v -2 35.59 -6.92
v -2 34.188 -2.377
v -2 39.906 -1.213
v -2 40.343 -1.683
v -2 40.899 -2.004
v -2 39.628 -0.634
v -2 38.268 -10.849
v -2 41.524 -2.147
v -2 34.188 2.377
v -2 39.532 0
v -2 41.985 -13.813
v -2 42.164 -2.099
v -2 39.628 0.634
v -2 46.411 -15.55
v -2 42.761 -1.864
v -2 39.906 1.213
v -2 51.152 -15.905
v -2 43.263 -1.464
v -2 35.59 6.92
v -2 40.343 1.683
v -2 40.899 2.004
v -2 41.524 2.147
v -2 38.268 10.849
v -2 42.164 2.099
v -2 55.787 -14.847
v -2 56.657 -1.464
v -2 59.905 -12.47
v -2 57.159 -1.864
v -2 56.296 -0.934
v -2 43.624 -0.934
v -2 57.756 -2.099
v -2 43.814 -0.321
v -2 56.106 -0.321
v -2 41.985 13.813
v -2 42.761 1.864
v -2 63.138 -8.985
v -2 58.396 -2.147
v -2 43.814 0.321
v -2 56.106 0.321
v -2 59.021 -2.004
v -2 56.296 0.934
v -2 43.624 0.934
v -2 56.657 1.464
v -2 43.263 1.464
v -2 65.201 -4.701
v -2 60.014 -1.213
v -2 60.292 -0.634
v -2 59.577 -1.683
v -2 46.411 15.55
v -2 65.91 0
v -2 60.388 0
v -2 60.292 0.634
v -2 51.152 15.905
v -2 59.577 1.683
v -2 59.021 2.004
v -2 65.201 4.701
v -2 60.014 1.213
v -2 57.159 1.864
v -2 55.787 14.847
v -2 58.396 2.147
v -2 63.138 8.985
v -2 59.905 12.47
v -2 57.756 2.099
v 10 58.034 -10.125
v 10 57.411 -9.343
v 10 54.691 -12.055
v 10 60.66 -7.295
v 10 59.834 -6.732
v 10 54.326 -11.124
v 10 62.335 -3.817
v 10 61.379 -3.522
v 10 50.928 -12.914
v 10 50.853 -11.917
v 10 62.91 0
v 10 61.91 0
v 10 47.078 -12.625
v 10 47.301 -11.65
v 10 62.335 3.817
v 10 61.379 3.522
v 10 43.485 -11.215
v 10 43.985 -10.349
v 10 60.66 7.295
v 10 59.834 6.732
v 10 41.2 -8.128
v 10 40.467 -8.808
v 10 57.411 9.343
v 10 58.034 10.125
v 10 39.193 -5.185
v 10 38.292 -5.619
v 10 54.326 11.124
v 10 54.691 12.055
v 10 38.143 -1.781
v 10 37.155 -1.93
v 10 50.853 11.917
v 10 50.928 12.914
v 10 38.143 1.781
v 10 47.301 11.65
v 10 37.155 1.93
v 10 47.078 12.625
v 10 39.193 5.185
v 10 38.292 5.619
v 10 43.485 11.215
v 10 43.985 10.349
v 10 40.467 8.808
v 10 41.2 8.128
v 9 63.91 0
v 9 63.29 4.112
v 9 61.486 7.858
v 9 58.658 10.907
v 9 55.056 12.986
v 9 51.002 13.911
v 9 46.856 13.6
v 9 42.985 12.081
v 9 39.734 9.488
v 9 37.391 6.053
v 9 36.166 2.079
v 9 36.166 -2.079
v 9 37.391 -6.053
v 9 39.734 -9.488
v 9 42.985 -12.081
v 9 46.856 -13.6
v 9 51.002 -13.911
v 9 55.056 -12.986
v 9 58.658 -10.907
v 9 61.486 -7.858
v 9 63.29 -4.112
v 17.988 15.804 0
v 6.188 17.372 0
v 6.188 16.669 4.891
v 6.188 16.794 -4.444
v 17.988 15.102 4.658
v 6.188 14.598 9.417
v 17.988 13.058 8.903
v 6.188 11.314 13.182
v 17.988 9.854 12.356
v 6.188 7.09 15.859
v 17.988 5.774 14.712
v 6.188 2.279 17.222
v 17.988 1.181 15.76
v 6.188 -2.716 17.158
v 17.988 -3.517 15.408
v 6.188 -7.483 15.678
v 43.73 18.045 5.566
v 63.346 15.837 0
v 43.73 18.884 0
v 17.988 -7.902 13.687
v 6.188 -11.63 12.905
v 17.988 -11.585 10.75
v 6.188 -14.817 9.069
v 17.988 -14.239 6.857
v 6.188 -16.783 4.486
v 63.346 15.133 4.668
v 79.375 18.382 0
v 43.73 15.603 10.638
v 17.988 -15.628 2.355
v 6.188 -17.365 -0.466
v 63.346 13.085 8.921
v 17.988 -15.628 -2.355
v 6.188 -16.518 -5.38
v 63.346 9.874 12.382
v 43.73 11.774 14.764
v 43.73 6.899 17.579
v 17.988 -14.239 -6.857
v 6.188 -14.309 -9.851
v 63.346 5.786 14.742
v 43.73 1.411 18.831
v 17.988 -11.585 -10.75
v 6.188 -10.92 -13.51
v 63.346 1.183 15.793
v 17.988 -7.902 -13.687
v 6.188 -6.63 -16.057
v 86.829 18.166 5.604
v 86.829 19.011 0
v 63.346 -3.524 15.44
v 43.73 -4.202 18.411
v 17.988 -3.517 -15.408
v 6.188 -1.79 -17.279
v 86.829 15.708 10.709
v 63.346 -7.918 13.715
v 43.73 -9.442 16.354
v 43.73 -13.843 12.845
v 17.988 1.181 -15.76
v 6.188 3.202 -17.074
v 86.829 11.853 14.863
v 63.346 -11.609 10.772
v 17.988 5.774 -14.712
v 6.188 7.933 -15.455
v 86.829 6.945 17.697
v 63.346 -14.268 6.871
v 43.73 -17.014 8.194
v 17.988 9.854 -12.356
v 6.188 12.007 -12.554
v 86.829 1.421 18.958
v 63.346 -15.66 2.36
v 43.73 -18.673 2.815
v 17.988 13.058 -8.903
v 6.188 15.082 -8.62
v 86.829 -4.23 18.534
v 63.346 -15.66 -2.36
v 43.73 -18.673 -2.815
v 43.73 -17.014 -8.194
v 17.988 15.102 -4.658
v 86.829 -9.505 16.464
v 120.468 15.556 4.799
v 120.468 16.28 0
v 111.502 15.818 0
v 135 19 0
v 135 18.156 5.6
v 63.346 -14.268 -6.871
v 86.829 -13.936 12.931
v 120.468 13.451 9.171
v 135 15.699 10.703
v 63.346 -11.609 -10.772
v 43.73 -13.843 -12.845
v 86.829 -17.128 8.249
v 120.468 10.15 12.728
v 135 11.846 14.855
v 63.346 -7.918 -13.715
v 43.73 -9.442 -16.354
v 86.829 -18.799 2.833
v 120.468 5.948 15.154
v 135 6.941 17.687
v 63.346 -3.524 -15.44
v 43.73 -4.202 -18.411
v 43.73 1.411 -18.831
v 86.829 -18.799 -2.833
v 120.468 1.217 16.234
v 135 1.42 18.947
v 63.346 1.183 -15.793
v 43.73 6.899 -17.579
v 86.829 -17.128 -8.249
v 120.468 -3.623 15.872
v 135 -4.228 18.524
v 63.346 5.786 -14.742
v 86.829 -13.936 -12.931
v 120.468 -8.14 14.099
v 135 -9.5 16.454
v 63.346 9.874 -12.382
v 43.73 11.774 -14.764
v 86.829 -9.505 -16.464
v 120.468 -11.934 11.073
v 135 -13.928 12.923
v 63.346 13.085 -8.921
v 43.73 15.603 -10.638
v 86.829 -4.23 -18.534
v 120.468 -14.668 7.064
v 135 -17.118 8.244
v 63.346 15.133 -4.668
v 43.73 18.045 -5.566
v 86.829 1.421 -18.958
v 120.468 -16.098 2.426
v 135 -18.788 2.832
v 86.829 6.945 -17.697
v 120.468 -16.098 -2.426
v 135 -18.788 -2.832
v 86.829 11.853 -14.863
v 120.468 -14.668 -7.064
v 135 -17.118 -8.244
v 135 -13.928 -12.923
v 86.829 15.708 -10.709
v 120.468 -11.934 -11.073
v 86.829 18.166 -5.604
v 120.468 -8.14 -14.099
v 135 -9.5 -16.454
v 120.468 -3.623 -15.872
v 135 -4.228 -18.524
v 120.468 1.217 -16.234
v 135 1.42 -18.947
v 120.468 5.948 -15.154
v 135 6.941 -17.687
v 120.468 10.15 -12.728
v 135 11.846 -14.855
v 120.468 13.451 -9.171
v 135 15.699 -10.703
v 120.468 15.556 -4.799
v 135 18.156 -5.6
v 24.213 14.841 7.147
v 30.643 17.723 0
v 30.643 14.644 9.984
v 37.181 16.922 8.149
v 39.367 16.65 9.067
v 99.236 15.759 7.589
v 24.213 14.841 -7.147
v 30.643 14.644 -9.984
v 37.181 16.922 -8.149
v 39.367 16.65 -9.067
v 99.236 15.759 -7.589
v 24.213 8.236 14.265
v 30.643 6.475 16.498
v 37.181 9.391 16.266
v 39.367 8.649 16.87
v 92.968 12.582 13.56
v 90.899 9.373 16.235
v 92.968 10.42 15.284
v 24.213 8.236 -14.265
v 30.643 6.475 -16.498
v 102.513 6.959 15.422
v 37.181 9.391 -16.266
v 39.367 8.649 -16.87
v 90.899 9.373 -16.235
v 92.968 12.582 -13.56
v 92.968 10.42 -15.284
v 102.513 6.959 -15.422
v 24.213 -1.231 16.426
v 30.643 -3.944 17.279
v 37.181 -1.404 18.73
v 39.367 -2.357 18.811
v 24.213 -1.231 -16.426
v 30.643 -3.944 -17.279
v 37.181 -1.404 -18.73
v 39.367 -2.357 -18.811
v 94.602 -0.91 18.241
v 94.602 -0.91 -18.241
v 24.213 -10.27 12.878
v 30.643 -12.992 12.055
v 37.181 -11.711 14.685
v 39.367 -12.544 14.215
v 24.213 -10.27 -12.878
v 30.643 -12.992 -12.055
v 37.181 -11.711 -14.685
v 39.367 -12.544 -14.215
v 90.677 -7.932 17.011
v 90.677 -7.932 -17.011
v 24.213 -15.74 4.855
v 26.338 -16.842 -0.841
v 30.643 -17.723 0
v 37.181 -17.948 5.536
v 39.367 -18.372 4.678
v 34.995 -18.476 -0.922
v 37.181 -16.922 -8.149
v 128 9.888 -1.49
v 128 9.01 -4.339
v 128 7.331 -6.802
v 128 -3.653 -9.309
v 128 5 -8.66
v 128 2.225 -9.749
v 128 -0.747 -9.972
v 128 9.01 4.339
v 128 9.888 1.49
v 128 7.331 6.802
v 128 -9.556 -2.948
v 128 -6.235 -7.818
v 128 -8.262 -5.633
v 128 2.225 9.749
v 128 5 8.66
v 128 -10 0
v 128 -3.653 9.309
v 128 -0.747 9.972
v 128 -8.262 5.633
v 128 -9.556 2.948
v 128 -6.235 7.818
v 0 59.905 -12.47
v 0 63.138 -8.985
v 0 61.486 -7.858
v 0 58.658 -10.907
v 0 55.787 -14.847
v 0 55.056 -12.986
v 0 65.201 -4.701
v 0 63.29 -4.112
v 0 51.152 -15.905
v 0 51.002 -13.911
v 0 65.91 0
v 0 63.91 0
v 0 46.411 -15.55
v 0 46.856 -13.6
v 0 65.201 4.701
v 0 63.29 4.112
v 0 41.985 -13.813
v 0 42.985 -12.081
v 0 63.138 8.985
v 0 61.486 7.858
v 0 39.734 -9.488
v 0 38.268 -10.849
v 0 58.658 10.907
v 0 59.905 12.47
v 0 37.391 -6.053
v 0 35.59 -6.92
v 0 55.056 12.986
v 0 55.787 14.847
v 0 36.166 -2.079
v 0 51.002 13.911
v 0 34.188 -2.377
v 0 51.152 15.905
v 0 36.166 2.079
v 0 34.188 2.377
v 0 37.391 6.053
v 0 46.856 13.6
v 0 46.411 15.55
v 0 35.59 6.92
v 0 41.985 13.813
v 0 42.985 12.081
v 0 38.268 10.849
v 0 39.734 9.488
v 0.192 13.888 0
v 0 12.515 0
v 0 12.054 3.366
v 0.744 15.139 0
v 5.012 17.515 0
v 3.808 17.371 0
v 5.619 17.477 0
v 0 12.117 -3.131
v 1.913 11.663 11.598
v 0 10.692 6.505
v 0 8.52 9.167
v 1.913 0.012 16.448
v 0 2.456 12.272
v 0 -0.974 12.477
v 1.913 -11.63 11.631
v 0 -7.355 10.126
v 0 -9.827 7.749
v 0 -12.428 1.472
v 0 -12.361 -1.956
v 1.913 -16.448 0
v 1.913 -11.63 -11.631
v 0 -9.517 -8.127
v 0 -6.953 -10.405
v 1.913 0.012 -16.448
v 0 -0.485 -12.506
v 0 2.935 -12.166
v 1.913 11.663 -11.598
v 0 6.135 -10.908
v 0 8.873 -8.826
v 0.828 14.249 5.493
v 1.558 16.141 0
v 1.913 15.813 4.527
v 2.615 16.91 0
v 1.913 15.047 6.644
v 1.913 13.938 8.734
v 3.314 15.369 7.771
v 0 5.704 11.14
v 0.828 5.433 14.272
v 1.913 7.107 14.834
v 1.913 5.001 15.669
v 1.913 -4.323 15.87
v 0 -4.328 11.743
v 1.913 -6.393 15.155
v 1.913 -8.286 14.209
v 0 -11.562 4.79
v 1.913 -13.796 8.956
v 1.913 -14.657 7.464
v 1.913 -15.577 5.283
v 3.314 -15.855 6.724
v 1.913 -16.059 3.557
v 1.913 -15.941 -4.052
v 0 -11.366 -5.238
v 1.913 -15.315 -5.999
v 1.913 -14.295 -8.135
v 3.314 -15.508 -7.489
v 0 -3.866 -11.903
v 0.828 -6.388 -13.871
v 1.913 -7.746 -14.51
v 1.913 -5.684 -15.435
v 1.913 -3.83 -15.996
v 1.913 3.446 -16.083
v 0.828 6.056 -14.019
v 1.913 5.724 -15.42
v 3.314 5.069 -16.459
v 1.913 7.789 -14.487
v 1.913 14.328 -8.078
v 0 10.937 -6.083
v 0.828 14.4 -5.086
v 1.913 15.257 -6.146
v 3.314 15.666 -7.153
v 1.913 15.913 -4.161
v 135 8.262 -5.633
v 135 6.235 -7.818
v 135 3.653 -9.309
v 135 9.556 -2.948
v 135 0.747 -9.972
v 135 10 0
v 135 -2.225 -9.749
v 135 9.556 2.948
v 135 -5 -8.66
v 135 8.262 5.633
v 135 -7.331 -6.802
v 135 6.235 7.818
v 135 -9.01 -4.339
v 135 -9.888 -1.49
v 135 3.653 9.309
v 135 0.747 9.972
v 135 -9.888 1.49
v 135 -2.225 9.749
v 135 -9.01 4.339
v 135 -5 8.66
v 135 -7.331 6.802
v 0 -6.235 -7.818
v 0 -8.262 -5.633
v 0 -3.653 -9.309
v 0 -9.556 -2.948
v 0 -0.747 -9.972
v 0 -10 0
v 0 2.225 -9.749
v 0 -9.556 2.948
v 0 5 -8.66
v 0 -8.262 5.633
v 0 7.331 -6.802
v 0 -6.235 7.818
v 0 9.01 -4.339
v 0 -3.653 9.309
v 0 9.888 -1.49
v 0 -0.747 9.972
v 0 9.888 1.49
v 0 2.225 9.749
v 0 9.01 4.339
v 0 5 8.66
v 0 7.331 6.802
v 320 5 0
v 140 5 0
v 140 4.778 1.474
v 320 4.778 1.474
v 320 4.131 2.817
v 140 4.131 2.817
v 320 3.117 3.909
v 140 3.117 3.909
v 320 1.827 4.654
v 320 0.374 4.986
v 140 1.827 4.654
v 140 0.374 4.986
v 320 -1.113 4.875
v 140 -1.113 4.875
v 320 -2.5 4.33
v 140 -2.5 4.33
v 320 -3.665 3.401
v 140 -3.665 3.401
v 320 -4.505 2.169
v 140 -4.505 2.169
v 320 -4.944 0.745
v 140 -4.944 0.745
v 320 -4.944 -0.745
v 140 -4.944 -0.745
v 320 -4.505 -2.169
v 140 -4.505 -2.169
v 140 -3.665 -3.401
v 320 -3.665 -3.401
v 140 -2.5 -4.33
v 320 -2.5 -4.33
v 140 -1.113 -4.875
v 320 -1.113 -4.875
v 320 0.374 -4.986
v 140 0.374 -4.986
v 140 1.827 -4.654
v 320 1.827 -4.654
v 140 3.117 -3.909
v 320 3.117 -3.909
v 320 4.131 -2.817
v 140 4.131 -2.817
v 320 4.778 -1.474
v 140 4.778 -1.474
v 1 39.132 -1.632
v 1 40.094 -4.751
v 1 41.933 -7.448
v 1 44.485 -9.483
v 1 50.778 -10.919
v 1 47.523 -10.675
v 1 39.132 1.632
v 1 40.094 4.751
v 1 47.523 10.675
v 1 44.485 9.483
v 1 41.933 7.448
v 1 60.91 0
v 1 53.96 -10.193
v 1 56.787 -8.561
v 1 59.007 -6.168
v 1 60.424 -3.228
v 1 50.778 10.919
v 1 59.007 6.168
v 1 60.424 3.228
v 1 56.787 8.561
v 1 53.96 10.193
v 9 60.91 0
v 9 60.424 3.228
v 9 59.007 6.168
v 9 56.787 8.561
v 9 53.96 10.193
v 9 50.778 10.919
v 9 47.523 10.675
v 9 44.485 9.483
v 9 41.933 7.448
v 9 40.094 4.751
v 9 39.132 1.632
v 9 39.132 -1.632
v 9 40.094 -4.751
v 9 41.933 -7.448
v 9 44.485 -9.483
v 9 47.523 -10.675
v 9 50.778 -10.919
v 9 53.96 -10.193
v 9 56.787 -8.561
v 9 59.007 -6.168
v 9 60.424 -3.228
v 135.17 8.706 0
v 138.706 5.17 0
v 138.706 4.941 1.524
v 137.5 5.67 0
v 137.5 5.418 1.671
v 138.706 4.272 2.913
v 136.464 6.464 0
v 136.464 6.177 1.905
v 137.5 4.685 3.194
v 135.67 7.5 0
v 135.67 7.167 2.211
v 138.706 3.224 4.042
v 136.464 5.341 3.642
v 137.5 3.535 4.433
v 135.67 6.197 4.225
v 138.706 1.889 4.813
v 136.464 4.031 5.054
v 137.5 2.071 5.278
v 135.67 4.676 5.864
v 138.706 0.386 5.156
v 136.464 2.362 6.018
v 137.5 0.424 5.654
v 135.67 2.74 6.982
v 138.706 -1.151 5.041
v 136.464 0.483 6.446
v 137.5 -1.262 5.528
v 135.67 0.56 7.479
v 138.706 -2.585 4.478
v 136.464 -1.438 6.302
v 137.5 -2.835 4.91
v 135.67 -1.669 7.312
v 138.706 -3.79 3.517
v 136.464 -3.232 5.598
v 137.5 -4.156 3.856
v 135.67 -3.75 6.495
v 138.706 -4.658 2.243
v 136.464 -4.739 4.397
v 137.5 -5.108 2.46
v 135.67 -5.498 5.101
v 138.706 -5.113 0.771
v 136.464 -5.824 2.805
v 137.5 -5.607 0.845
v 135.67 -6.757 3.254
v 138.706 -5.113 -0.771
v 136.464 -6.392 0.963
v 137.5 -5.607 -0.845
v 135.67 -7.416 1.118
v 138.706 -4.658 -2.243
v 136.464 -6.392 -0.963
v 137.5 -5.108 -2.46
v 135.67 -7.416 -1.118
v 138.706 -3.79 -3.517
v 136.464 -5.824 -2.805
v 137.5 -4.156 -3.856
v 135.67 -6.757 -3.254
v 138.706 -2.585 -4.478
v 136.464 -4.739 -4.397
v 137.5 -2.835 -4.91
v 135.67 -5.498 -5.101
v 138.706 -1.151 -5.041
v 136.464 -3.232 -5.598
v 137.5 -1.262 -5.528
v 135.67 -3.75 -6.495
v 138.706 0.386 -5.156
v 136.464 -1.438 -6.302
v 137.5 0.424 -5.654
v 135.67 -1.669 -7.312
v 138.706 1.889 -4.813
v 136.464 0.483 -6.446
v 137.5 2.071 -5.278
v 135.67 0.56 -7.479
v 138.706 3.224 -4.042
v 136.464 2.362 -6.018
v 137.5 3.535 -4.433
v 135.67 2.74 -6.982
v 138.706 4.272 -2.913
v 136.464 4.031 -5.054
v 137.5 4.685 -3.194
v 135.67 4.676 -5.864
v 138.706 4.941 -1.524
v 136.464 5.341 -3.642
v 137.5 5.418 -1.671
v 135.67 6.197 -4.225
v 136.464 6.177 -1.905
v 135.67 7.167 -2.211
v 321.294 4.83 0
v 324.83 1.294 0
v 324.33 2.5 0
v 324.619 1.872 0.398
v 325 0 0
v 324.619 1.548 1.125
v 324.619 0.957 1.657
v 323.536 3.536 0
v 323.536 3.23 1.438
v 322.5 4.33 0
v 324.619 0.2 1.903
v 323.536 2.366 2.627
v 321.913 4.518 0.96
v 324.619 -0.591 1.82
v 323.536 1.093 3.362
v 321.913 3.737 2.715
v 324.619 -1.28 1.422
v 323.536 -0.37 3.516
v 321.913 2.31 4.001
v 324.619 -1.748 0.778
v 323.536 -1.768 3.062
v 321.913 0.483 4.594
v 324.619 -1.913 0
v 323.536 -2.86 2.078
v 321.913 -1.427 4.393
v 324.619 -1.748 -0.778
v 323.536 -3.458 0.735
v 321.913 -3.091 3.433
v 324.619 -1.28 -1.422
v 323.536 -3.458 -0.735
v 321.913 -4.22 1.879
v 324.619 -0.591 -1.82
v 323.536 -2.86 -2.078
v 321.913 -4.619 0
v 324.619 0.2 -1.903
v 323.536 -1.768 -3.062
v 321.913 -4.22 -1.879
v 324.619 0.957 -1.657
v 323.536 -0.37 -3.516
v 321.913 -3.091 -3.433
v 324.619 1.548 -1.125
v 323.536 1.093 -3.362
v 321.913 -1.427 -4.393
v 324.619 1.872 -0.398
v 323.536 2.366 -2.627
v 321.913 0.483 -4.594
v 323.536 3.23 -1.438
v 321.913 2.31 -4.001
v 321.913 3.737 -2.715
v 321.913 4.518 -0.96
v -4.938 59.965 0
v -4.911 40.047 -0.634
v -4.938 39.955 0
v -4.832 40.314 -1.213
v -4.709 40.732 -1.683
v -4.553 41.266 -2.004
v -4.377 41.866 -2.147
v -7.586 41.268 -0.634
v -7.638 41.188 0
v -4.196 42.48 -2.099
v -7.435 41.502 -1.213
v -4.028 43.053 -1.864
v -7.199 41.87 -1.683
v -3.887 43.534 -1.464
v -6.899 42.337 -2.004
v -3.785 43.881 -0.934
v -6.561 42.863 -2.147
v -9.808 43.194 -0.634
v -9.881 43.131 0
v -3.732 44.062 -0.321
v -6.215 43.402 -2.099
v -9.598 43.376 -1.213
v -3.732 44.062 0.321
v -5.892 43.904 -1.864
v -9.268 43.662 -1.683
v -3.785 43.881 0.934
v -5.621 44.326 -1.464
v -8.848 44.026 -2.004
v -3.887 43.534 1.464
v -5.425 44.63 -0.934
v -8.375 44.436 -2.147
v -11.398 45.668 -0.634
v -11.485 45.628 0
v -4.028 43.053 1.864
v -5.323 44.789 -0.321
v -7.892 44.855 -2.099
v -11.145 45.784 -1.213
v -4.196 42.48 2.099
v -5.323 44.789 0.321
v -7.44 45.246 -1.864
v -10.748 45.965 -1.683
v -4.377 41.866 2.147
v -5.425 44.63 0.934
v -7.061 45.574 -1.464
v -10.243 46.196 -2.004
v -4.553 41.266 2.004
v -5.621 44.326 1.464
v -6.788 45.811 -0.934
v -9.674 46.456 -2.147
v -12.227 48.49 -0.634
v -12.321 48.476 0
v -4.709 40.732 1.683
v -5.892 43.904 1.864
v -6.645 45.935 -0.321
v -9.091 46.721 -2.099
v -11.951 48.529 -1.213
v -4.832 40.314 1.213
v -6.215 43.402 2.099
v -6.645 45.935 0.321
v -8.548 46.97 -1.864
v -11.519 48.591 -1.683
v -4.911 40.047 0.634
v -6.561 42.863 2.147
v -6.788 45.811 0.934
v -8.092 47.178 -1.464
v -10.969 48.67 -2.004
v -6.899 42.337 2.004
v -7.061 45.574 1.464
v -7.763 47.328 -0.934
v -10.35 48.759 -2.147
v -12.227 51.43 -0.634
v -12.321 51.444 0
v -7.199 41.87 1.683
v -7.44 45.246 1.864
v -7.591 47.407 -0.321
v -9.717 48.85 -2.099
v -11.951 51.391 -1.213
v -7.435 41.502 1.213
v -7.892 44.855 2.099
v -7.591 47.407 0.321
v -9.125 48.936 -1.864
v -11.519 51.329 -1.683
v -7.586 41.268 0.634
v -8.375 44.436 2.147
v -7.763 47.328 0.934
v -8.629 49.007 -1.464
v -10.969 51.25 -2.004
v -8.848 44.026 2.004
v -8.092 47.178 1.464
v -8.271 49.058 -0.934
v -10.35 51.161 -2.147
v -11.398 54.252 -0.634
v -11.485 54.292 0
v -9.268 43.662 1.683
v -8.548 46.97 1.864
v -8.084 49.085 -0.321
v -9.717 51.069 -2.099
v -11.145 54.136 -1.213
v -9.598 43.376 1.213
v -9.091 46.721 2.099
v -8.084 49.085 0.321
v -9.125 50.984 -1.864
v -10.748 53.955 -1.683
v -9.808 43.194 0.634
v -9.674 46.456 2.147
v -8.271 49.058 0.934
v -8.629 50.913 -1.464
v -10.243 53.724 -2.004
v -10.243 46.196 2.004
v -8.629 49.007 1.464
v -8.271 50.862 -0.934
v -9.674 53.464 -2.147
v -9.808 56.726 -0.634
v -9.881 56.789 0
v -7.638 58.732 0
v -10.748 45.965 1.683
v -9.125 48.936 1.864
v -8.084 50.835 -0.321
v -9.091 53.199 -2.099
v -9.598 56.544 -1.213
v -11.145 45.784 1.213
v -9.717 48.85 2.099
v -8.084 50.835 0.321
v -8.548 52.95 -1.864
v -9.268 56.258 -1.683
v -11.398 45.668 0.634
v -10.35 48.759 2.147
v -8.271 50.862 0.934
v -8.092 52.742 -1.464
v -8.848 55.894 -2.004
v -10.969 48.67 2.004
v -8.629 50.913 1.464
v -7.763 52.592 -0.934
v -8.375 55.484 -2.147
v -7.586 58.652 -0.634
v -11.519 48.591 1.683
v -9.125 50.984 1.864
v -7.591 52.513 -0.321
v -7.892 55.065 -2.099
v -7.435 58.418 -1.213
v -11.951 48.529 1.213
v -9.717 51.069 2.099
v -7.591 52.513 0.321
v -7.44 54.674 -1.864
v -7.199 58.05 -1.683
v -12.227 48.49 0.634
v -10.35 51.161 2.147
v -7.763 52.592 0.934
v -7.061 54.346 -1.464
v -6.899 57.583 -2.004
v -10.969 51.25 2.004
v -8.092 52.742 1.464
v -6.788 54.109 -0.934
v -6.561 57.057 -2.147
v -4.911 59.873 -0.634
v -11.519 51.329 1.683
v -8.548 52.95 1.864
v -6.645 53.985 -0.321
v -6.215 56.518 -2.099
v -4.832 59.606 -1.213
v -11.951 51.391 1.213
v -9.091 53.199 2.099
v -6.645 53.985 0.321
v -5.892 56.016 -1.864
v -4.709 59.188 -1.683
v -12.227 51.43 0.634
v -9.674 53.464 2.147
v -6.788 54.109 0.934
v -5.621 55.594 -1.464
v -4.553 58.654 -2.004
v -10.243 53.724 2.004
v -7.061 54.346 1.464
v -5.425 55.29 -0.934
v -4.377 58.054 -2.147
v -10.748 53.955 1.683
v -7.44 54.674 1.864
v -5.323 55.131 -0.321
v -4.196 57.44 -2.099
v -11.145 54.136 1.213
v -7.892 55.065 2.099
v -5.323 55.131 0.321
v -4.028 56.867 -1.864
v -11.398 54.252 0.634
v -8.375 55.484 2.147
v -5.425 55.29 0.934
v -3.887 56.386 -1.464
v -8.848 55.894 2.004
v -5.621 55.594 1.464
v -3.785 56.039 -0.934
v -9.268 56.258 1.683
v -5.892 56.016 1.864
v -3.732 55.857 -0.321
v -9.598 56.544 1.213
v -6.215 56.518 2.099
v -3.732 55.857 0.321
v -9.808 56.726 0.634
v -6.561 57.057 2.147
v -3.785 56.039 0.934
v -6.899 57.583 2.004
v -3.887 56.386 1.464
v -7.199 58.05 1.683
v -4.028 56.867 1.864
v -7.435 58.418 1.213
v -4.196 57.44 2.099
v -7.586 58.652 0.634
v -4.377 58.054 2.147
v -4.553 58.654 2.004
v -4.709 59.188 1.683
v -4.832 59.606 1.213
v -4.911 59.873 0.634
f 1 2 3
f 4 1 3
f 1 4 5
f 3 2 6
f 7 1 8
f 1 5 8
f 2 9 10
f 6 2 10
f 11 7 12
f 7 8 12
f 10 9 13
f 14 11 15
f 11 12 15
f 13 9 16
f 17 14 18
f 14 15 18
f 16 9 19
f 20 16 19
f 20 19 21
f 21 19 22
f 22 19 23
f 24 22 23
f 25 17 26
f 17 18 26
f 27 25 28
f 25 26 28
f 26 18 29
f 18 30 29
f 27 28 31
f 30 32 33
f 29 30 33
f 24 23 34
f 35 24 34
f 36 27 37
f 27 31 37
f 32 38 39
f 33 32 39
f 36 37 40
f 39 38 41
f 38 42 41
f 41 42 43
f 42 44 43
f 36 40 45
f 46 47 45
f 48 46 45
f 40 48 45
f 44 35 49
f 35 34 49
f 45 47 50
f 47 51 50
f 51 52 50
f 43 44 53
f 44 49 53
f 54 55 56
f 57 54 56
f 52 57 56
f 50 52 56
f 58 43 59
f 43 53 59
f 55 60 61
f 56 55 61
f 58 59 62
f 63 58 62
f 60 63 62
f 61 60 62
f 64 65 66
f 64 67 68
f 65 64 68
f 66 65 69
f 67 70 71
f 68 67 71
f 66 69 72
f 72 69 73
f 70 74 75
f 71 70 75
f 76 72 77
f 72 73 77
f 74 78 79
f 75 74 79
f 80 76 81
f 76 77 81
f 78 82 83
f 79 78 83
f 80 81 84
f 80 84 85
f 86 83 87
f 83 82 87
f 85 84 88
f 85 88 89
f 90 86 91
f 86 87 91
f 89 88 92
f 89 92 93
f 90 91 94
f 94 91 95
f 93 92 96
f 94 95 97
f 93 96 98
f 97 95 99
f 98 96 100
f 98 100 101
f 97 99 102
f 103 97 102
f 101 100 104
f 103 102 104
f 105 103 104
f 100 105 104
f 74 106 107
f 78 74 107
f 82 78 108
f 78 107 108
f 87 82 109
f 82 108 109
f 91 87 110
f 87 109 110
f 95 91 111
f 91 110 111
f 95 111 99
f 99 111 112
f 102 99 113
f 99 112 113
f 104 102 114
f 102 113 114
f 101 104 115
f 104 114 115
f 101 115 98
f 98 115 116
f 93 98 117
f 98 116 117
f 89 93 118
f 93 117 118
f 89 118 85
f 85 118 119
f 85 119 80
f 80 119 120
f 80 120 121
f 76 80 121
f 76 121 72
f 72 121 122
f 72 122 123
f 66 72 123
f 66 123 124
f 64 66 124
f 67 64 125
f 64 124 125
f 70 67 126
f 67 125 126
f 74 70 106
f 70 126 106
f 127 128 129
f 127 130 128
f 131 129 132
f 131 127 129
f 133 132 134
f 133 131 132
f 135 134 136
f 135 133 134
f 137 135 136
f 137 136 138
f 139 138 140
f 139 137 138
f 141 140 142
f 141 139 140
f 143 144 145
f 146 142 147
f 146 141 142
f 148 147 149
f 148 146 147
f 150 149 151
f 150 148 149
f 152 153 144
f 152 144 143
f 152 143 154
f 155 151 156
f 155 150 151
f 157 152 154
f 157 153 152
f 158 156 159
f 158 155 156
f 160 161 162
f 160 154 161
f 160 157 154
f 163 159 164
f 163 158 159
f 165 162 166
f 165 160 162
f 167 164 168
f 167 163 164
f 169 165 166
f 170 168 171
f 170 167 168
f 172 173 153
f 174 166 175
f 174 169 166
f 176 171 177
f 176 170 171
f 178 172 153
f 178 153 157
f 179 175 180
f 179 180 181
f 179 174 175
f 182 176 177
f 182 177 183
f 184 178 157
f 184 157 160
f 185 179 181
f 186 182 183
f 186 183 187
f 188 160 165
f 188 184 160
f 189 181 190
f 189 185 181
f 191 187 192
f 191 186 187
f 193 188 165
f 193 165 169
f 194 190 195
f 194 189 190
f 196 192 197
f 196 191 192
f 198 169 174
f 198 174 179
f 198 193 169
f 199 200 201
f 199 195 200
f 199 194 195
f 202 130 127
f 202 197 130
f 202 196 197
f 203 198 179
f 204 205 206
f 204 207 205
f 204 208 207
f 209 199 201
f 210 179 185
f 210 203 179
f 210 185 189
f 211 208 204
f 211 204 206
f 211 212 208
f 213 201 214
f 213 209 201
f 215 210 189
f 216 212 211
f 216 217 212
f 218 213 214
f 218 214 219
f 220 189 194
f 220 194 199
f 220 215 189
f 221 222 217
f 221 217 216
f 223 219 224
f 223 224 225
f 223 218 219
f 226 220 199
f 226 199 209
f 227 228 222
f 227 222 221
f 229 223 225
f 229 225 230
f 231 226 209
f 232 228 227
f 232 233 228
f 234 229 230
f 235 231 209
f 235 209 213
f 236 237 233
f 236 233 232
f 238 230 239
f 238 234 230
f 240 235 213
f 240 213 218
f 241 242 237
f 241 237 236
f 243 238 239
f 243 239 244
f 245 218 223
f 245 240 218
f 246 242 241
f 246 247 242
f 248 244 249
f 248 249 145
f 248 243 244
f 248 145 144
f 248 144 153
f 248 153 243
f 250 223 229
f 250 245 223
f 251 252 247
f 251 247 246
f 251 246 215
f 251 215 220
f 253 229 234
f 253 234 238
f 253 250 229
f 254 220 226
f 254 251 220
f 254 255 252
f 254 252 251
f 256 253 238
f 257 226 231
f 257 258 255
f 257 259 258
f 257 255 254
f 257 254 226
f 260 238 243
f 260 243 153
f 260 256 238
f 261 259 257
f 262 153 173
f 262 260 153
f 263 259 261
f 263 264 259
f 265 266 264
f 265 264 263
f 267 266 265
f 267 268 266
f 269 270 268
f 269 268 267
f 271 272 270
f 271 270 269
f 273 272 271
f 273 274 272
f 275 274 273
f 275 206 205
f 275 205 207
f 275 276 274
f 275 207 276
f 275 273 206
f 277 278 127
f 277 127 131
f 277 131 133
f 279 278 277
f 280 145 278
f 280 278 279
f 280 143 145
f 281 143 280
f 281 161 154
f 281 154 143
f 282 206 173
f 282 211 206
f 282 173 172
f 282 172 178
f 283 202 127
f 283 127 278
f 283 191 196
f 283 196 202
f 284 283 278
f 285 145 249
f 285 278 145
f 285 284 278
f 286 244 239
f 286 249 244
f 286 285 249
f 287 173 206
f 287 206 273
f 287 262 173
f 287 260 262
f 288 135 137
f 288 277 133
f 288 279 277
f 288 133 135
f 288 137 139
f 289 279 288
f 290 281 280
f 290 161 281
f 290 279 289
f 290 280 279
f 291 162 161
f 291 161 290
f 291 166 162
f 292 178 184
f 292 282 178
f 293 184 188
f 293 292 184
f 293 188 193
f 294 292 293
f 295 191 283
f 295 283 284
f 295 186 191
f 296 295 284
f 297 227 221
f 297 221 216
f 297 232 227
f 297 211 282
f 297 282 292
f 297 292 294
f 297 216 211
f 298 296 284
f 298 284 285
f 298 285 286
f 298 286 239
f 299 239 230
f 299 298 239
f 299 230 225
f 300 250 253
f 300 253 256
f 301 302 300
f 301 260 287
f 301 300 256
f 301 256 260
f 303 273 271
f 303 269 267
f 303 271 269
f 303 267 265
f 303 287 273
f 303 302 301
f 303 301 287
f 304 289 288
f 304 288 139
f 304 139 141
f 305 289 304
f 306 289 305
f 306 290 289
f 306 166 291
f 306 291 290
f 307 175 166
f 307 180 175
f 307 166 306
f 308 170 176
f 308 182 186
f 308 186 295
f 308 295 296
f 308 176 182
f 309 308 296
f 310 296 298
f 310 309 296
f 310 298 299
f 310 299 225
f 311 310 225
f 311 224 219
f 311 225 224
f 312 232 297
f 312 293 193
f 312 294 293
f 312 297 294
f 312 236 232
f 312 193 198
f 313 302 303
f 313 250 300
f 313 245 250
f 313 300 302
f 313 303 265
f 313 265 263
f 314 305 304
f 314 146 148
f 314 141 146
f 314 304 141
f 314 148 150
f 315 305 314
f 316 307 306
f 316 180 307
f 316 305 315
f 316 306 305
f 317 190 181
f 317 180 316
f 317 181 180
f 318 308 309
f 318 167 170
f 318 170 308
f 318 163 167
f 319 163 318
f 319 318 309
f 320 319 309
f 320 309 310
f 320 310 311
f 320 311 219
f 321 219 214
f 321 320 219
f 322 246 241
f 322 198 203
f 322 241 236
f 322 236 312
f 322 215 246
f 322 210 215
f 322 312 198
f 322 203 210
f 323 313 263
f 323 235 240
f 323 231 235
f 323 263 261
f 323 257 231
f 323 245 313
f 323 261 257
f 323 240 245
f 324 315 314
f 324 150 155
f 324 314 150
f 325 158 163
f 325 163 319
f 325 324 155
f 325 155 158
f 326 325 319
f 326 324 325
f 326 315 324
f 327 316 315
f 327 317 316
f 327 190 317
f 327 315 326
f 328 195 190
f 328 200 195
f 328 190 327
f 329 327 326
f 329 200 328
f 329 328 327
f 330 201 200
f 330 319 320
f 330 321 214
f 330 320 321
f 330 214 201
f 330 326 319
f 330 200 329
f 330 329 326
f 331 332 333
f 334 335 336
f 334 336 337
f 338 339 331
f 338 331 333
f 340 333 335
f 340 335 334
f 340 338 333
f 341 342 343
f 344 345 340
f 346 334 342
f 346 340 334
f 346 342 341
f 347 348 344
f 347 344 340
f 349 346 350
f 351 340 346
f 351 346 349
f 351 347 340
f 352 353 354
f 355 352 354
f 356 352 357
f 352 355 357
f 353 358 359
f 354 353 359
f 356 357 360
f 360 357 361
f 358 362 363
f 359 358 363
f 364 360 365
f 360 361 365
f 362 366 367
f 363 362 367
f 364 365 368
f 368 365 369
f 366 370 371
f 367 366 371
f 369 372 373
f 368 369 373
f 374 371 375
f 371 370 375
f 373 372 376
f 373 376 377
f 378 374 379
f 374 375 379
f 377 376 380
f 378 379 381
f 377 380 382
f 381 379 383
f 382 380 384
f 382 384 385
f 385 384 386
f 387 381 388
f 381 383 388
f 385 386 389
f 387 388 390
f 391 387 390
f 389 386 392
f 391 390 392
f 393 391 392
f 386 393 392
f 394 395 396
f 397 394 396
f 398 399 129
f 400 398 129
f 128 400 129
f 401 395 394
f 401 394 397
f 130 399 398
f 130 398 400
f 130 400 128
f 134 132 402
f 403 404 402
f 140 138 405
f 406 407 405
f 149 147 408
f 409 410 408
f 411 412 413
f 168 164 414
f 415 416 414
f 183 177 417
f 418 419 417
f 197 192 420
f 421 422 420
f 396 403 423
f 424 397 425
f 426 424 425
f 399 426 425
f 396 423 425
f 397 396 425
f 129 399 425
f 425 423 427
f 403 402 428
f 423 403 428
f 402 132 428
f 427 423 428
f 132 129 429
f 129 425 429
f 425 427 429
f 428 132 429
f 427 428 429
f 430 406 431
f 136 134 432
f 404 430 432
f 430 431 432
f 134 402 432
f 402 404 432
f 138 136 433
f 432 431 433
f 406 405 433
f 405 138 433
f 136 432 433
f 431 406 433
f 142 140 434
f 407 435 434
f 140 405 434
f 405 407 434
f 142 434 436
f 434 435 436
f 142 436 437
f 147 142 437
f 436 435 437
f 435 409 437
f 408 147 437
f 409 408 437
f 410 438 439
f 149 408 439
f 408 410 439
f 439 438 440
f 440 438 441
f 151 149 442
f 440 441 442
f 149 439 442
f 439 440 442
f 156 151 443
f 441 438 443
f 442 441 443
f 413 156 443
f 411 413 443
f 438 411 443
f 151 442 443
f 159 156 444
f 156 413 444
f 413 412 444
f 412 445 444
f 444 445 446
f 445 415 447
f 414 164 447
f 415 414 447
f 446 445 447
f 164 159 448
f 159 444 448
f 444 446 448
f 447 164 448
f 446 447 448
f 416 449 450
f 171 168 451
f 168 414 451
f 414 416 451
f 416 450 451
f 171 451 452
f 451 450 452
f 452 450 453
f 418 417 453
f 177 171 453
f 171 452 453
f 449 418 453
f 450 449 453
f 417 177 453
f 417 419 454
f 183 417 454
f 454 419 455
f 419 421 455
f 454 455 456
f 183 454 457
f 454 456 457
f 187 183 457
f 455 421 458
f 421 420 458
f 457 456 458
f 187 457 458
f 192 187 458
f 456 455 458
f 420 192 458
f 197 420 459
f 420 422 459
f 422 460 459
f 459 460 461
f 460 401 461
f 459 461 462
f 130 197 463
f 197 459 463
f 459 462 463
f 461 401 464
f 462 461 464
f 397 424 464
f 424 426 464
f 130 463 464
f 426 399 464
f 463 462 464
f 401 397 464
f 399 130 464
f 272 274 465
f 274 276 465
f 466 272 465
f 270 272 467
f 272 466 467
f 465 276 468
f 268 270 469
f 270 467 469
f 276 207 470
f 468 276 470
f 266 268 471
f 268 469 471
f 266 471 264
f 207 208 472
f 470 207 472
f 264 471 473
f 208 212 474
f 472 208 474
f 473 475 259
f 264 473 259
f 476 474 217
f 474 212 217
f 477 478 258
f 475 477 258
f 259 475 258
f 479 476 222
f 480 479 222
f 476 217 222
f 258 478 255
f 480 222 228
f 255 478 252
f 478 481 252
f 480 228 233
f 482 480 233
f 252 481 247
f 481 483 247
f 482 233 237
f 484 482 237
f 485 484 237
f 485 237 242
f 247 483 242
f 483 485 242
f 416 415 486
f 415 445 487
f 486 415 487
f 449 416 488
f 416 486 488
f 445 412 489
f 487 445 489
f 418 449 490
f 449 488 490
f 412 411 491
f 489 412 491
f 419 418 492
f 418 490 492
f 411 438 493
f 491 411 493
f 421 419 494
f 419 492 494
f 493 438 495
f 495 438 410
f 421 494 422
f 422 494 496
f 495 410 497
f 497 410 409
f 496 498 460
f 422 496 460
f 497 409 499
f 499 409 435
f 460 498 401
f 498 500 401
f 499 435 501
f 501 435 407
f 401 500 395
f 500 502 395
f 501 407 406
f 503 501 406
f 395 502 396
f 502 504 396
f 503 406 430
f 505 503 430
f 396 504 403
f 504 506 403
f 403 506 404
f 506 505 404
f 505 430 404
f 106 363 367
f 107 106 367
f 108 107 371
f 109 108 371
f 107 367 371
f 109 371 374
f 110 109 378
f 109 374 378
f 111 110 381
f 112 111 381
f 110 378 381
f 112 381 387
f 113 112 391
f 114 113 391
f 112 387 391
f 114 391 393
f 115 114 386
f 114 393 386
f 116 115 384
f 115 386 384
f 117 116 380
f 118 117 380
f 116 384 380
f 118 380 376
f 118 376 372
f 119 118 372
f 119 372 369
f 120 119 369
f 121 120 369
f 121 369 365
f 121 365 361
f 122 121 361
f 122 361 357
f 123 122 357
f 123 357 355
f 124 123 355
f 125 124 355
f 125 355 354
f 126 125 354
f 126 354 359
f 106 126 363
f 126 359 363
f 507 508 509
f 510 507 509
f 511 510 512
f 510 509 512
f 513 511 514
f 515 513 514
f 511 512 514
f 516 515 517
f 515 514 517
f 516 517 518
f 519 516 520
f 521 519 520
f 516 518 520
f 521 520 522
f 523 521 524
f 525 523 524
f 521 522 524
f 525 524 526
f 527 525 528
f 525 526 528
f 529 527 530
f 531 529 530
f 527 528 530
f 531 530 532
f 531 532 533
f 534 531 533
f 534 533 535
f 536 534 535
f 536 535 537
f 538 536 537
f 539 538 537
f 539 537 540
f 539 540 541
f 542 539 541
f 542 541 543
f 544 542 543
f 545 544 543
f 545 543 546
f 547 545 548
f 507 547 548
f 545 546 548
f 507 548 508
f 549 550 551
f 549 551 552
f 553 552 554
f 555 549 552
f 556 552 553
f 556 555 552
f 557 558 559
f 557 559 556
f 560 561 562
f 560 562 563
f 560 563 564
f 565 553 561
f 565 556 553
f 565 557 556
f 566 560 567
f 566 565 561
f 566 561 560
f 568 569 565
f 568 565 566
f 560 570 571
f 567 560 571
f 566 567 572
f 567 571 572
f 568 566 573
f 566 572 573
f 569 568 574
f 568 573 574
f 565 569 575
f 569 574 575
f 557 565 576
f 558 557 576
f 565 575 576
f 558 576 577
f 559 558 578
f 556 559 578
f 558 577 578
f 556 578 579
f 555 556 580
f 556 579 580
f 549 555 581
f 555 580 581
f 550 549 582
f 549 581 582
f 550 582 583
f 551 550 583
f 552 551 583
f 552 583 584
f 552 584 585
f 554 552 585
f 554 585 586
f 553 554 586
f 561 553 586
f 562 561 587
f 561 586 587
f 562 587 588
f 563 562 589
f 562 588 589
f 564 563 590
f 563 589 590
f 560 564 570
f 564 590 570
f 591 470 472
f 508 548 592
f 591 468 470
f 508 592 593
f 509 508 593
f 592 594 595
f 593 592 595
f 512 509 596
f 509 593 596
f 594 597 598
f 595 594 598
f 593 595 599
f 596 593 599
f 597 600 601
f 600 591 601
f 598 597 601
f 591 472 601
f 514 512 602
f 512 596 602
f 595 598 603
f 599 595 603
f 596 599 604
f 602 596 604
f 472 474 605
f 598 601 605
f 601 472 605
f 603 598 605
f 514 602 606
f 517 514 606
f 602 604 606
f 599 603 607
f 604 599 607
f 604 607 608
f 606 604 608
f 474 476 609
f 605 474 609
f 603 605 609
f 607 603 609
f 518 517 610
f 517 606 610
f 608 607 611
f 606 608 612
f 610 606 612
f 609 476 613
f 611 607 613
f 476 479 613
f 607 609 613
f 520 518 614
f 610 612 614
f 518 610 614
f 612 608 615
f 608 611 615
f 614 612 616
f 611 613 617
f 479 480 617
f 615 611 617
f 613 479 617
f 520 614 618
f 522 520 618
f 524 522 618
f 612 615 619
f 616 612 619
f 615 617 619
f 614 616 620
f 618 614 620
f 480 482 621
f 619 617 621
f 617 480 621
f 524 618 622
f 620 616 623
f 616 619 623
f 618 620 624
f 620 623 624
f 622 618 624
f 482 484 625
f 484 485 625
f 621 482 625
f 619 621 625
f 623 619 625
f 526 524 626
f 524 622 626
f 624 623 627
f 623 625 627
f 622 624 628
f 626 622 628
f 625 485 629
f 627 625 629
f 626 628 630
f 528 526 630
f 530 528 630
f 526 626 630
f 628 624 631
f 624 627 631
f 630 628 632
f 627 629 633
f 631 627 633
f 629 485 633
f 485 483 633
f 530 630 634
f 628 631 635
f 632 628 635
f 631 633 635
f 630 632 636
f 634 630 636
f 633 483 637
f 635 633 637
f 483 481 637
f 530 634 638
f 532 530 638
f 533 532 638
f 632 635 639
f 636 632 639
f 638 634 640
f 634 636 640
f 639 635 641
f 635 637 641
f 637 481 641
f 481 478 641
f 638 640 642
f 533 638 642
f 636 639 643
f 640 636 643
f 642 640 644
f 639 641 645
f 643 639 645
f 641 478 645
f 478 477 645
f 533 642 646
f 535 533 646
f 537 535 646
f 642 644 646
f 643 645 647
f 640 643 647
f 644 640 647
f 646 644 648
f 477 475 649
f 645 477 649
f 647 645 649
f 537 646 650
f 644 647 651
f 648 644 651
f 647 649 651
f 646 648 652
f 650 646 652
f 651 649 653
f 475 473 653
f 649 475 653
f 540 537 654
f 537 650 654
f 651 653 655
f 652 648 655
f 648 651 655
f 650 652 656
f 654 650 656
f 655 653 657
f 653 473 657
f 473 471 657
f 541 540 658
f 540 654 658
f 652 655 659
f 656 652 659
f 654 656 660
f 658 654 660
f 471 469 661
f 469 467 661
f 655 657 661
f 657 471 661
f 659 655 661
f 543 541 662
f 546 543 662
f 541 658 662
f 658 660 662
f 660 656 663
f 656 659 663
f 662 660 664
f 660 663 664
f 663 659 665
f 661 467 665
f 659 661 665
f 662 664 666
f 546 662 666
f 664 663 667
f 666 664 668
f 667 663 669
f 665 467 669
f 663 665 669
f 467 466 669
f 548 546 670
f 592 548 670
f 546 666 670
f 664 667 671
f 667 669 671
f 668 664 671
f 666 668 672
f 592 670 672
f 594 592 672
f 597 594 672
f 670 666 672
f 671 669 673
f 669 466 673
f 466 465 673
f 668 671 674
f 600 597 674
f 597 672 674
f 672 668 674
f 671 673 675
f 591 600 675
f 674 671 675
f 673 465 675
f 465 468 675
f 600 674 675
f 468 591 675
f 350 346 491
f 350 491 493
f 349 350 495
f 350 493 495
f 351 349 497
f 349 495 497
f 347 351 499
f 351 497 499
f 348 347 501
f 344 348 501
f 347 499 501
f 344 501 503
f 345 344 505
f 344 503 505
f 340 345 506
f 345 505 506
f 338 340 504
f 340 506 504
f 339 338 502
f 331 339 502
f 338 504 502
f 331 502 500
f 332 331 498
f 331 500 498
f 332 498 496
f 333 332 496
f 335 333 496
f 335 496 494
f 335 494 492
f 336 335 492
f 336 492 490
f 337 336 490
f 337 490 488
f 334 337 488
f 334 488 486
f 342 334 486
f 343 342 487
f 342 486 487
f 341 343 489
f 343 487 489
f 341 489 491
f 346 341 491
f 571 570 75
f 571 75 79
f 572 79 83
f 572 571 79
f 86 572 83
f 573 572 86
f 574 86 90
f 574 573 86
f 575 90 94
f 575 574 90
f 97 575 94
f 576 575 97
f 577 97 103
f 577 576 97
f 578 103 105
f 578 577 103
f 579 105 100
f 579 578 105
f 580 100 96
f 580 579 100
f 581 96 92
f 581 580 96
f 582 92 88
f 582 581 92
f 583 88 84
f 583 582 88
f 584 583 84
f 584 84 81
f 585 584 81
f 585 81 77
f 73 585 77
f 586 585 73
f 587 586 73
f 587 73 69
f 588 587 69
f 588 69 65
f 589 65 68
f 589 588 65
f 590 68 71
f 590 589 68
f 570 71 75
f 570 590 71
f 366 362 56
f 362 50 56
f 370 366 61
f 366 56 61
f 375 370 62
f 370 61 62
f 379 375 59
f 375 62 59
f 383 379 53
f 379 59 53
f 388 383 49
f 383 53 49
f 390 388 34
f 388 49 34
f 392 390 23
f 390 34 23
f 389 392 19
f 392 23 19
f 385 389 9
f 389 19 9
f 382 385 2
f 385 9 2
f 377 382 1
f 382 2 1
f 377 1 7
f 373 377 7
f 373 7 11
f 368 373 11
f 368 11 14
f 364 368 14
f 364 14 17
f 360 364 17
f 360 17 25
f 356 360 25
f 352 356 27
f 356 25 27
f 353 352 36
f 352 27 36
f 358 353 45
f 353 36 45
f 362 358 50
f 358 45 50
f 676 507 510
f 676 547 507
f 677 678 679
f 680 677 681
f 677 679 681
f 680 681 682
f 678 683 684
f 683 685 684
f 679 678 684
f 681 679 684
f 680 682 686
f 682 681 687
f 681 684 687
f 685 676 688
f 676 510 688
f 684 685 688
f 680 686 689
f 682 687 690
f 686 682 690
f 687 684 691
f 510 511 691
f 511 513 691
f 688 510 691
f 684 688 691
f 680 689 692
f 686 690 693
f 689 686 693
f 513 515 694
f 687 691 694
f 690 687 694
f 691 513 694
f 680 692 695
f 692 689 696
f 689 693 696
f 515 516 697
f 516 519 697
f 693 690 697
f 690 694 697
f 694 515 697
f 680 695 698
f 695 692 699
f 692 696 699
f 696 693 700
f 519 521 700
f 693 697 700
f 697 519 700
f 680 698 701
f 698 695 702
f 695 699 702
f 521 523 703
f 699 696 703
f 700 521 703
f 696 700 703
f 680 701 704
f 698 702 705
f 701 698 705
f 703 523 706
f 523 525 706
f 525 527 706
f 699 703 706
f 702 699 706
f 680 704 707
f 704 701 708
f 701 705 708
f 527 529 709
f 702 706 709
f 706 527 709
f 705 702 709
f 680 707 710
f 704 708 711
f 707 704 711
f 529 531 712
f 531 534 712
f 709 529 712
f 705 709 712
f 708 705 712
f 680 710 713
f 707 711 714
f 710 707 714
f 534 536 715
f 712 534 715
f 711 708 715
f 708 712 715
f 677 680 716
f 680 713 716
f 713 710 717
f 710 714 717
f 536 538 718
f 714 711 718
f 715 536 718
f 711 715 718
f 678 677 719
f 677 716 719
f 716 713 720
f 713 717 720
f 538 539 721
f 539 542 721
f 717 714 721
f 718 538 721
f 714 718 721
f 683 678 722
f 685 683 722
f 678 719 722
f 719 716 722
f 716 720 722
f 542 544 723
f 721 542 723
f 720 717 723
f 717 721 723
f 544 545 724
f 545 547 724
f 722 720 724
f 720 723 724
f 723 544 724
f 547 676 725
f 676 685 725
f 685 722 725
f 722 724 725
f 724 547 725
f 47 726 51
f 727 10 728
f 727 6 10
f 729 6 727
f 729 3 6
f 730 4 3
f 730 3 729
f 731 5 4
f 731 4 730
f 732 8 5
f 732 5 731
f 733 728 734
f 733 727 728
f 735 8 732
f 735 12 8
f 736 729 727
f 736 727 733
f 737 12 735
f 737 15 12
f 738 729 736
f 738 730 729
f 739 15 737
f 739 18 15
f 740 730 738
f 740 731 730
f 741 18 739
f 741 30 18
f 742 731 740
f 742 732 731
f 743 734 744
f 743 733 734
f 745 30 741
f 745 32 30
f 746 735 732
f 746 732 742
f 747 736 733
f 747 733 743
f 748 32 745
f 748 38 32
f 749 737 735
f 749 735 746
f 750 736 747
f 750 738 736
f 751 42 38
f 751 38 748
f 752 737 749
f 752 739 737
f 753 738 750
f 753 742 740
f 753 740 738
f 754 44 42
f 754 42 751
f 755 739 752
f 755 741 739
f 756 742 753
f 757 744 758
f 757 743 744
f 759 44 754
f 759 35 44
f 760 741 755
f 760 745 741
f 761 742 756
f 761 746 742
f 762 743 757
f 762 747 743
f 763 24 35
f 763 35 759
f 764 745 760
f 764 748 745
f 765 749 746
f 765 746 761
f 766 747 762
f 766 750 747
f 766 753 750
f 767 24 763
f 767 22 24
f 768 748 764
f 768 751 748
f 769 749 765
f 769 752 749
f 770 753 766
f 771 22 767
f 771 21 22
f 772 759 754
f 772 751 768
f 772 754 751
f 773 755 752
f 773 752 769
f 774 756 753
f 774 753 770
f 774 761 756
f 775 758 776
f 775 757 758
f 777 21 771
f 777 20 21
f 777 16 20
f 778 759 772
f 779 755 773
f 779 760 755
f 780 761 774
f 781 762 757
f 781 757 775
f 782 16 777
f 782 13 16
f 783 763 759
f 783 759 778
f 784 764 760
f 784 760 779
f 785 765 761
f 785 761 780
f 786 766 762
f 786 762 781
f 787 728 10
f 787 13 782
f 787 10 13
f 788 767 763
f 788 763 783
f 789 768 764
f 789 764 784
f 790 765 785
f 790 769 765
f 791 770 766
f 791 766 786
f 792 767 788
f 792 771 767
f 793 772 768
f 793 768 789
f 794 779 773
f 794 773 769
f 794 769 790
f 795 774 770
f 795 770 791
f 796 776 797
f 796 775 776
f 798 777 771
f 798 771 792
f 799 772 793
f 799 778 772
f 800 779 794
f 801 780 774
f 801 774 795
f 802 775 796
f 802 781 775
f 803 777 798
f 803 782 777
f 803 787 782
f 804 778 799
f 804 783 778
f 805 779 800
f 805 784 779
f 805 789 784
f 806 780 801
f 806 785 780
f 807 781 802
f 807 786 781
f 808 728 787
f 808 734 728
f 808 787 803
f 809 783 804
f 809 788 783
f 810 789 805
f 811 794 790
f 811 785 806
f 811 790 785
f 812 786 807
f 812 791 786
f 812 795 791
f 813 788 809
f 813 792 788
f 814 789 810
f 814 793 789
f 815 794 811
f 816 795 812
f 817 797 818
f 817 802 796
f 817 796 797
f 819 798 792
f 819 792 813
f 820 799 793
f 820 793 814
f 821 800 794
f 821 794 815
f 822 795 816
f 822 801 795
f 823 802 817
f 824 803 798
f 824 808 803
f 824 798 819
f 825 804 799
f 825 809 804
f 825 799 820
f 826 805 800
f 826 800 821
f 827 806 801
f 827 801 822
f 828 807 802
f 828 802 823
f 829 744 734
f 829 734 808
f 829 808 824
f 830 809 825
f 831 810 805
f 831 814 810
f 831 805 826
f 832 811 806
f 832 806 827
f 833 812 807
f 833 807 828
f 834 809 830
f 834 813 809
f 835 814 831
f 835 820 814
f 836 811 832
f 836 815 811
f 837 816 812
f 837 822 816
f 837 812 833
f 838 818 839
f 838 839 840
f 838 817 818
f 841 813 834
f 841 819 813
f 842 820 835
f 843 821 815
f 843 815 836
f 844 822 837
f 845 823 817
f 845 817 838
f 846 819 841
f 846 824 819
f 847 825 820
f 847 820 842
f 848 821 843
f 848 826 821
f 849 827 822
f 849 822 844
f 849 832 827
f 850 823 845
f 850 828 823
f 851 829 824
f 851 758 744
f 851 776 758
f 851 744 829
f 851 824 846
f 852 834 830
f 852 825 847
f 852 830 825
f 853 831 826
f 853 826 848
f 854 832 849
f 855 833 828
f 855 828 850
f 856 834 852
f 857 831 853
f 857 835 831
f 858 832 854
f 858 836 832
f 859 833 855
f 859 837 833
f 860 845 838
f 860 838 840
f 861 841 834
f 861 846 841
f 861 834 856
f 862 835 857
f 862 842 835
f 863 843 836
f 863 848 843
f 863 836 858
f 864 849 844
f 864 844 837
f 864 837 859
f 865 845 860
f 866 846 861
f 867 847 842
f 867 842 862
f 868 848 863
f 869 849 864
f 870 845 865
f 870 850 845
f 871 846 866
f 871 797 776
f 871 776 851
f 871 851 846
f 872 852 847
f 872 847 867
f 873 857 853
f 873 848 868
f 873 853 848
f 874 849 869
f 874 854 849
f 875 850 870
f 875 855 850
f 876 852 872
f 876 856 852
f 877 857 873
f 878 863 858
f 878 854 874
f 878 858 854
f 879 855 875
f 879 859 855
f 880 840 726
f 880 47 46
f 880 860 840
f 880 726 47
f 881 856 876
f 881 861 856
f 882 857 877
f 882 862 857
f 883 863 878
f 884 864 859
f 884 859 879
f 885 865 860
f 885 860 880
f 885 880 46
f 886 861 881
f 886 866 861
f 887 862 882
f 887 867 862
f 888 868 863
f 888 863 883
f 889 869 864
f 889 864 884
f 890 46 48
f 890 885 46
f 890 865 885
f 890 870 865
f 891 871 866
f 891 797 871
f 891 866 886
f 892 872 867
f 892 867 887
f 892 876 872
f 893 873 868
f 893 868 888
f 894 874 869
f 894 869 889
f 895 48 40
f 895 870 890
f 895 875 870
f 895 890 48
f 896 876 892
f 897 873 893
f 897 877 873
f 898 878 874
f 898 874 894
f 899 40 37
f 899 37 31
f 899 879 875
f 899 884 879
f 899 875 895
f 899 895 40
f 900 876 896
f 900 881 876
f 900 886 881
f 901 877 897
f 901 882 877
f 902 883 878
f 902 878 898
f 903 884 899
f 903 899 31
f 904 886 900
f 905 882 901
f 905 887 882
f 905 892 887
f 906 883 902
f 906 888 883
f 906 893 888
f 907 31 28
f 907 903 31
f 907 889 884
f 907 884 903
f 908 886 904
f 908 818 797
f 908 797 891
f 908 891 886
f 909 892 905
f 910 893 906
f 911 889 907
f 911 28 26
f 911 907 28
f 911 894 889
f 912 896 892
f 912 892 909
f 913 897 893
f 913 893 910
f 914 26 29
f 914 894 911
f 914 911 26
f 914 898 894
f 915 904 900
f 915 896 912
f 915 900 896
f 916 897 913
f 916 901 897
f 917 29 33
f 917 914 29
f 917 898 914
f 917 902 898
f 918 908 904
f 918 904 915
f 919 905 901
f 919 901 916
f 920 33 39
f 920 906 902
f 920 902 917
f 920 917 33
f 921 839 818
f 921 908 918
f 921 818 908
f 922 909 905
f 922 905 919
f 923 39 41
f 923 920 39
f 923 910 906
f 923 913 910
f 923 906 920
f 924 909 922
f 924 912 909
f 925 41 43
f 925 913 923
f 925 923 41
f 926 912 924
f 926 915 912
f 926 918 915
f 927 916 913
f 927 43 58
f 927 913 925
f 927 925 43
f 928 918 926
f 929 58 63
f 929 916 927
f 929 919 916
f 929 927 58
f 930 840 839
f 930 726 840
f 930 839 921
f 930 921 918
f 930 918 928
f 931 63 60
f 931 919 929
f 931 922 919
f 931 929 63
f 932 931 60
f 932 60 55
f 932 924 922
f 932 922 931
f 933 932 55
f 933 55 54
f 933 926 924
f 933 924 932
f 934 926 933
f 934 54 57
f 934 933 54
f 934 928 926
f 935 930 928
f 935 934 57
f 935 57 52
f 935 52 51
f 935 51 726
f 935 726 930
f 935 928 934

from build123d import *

# Parameters (mm, degrees)
F2_R      = 5
F3_R      = 10
F4_DEPTH  = 128
F9_R      = 10.95
F10_DEPTH = 9
F11_SIZE  = 1


# Not quite as in the source:
# - a feature of the source that left no trace in its solid (it failed there, or was rolled back) is left out


with BuildPart() as f1:
    # F0 (on Top) → F1 (revolve)
    with BuildSketch(Plane.XY):
        with BuildLine():
            Line((0, 19), (0, 0))
            Line((0, 0), (135, 0))
            Line((135, 0), (325, 0))
            Line((325, 0), (325, 5))
            Line((325, 5), (135, 5))
            Line((135, 5), (135, 19))
            add(Edge.make_bspline(
                [(0, 19), (6.2298148154, 17.3381037384), (18.9116523982, 13.5198586362), (41.4617916208, 21.987289281), (63.8339880536, 12.8409507176), (84.8789443524, 21.983405638), (111.8259427397, 13.4206624804), (126.1338785408, 17.3073923453), (135, 19)],
                knots=[0, 0, 0, 0, 0.1530474504, 0.3200912758, 0.4861069731, 0.6487473436, 0.8283759765, 1, 1, 1, 1], degree=3))
        make_face()
    revolve(axis=Axis((67.5, 0, 0), (1, 0, 0)))

    # F2
    f2_edges = [f1.edges().sort_by_distance(p)[0] for p in [
        (325, -5, 0),
        (135, -5, 0),
        (230, 5, 0),
        (0, -19, 0),
    ]]
    fillet(f2_edges, radius=F2_R)

    # F3 (on face) → F4 (cut)
    with BuildSketch(Plane(origin=(0, 0, 0), x_dir=(0, -1, 0), z_dir=(-1, 0, 0))):
        Circle(F3_R)
    extrude(amount=-F4_DEPTH, mode=Mode.SUBTRACT)


with BuildPart() as f6:
    # F5 (on Top) → F6 (revolve)
    with BuildSketch(Plane.XY):
        Polygon((-2, 49.9599839872), (0, 49.9599839872), (10, 49.9599839872), (10, 63.9099839872), (0, 63.9099839872), (0, 65.9099839872), (-2, 65.9099839872), (-2, 58.2169018066), align=None)
    revolve(axis=Axis((-1, 49.9599839872, 0), (1, 0, 0)))

    # F8: sweep along a path in F5
    with BuildLine(Plane.XY) as f8_path:
        ThreePointArc((-2, 41.7030661678), (-10.2569178194, 49.9599839872), (-2, 58.2169018066))
    # F7 (on face) → F8 (sweep)
    with BuildSketch(Plane(origin=(-2, 0, 0), x_dir=(0, -1, 0), z_dir=(-1, 0, 0))):
        with BuildLine():
            ThreePointArc((-43.8375558203, 0), (-41.6849839872, -2.1525718331), (-39.5324121541, 0))
            ThreePointArc((-39.5324121541, 0), (-41.6849839872, 2.1525718331), (-43.8375558203, 0))
        make_face()
    sweep(path=f8_path.line)

    # F9 (on face) → F10 (cut)
    with BuildSketch(Plane.YZ.offset(10)):
        with Locations((49.9599839872, 0)):
            Circle(F9_R)
    extrude(amount=-F10_DEPTH, mode=Mode.SUBTRACT)

    # F11
    f11_edges = [f6.edges().sort_by_distance(p)[0] for p in [
        (10, 36.009984, 0),
        (10, 39.009984, 0),
    ]]
    chamfer(f11_edges, length=F11_SIZE)


solid = Compound([f1.part, f6.part])
